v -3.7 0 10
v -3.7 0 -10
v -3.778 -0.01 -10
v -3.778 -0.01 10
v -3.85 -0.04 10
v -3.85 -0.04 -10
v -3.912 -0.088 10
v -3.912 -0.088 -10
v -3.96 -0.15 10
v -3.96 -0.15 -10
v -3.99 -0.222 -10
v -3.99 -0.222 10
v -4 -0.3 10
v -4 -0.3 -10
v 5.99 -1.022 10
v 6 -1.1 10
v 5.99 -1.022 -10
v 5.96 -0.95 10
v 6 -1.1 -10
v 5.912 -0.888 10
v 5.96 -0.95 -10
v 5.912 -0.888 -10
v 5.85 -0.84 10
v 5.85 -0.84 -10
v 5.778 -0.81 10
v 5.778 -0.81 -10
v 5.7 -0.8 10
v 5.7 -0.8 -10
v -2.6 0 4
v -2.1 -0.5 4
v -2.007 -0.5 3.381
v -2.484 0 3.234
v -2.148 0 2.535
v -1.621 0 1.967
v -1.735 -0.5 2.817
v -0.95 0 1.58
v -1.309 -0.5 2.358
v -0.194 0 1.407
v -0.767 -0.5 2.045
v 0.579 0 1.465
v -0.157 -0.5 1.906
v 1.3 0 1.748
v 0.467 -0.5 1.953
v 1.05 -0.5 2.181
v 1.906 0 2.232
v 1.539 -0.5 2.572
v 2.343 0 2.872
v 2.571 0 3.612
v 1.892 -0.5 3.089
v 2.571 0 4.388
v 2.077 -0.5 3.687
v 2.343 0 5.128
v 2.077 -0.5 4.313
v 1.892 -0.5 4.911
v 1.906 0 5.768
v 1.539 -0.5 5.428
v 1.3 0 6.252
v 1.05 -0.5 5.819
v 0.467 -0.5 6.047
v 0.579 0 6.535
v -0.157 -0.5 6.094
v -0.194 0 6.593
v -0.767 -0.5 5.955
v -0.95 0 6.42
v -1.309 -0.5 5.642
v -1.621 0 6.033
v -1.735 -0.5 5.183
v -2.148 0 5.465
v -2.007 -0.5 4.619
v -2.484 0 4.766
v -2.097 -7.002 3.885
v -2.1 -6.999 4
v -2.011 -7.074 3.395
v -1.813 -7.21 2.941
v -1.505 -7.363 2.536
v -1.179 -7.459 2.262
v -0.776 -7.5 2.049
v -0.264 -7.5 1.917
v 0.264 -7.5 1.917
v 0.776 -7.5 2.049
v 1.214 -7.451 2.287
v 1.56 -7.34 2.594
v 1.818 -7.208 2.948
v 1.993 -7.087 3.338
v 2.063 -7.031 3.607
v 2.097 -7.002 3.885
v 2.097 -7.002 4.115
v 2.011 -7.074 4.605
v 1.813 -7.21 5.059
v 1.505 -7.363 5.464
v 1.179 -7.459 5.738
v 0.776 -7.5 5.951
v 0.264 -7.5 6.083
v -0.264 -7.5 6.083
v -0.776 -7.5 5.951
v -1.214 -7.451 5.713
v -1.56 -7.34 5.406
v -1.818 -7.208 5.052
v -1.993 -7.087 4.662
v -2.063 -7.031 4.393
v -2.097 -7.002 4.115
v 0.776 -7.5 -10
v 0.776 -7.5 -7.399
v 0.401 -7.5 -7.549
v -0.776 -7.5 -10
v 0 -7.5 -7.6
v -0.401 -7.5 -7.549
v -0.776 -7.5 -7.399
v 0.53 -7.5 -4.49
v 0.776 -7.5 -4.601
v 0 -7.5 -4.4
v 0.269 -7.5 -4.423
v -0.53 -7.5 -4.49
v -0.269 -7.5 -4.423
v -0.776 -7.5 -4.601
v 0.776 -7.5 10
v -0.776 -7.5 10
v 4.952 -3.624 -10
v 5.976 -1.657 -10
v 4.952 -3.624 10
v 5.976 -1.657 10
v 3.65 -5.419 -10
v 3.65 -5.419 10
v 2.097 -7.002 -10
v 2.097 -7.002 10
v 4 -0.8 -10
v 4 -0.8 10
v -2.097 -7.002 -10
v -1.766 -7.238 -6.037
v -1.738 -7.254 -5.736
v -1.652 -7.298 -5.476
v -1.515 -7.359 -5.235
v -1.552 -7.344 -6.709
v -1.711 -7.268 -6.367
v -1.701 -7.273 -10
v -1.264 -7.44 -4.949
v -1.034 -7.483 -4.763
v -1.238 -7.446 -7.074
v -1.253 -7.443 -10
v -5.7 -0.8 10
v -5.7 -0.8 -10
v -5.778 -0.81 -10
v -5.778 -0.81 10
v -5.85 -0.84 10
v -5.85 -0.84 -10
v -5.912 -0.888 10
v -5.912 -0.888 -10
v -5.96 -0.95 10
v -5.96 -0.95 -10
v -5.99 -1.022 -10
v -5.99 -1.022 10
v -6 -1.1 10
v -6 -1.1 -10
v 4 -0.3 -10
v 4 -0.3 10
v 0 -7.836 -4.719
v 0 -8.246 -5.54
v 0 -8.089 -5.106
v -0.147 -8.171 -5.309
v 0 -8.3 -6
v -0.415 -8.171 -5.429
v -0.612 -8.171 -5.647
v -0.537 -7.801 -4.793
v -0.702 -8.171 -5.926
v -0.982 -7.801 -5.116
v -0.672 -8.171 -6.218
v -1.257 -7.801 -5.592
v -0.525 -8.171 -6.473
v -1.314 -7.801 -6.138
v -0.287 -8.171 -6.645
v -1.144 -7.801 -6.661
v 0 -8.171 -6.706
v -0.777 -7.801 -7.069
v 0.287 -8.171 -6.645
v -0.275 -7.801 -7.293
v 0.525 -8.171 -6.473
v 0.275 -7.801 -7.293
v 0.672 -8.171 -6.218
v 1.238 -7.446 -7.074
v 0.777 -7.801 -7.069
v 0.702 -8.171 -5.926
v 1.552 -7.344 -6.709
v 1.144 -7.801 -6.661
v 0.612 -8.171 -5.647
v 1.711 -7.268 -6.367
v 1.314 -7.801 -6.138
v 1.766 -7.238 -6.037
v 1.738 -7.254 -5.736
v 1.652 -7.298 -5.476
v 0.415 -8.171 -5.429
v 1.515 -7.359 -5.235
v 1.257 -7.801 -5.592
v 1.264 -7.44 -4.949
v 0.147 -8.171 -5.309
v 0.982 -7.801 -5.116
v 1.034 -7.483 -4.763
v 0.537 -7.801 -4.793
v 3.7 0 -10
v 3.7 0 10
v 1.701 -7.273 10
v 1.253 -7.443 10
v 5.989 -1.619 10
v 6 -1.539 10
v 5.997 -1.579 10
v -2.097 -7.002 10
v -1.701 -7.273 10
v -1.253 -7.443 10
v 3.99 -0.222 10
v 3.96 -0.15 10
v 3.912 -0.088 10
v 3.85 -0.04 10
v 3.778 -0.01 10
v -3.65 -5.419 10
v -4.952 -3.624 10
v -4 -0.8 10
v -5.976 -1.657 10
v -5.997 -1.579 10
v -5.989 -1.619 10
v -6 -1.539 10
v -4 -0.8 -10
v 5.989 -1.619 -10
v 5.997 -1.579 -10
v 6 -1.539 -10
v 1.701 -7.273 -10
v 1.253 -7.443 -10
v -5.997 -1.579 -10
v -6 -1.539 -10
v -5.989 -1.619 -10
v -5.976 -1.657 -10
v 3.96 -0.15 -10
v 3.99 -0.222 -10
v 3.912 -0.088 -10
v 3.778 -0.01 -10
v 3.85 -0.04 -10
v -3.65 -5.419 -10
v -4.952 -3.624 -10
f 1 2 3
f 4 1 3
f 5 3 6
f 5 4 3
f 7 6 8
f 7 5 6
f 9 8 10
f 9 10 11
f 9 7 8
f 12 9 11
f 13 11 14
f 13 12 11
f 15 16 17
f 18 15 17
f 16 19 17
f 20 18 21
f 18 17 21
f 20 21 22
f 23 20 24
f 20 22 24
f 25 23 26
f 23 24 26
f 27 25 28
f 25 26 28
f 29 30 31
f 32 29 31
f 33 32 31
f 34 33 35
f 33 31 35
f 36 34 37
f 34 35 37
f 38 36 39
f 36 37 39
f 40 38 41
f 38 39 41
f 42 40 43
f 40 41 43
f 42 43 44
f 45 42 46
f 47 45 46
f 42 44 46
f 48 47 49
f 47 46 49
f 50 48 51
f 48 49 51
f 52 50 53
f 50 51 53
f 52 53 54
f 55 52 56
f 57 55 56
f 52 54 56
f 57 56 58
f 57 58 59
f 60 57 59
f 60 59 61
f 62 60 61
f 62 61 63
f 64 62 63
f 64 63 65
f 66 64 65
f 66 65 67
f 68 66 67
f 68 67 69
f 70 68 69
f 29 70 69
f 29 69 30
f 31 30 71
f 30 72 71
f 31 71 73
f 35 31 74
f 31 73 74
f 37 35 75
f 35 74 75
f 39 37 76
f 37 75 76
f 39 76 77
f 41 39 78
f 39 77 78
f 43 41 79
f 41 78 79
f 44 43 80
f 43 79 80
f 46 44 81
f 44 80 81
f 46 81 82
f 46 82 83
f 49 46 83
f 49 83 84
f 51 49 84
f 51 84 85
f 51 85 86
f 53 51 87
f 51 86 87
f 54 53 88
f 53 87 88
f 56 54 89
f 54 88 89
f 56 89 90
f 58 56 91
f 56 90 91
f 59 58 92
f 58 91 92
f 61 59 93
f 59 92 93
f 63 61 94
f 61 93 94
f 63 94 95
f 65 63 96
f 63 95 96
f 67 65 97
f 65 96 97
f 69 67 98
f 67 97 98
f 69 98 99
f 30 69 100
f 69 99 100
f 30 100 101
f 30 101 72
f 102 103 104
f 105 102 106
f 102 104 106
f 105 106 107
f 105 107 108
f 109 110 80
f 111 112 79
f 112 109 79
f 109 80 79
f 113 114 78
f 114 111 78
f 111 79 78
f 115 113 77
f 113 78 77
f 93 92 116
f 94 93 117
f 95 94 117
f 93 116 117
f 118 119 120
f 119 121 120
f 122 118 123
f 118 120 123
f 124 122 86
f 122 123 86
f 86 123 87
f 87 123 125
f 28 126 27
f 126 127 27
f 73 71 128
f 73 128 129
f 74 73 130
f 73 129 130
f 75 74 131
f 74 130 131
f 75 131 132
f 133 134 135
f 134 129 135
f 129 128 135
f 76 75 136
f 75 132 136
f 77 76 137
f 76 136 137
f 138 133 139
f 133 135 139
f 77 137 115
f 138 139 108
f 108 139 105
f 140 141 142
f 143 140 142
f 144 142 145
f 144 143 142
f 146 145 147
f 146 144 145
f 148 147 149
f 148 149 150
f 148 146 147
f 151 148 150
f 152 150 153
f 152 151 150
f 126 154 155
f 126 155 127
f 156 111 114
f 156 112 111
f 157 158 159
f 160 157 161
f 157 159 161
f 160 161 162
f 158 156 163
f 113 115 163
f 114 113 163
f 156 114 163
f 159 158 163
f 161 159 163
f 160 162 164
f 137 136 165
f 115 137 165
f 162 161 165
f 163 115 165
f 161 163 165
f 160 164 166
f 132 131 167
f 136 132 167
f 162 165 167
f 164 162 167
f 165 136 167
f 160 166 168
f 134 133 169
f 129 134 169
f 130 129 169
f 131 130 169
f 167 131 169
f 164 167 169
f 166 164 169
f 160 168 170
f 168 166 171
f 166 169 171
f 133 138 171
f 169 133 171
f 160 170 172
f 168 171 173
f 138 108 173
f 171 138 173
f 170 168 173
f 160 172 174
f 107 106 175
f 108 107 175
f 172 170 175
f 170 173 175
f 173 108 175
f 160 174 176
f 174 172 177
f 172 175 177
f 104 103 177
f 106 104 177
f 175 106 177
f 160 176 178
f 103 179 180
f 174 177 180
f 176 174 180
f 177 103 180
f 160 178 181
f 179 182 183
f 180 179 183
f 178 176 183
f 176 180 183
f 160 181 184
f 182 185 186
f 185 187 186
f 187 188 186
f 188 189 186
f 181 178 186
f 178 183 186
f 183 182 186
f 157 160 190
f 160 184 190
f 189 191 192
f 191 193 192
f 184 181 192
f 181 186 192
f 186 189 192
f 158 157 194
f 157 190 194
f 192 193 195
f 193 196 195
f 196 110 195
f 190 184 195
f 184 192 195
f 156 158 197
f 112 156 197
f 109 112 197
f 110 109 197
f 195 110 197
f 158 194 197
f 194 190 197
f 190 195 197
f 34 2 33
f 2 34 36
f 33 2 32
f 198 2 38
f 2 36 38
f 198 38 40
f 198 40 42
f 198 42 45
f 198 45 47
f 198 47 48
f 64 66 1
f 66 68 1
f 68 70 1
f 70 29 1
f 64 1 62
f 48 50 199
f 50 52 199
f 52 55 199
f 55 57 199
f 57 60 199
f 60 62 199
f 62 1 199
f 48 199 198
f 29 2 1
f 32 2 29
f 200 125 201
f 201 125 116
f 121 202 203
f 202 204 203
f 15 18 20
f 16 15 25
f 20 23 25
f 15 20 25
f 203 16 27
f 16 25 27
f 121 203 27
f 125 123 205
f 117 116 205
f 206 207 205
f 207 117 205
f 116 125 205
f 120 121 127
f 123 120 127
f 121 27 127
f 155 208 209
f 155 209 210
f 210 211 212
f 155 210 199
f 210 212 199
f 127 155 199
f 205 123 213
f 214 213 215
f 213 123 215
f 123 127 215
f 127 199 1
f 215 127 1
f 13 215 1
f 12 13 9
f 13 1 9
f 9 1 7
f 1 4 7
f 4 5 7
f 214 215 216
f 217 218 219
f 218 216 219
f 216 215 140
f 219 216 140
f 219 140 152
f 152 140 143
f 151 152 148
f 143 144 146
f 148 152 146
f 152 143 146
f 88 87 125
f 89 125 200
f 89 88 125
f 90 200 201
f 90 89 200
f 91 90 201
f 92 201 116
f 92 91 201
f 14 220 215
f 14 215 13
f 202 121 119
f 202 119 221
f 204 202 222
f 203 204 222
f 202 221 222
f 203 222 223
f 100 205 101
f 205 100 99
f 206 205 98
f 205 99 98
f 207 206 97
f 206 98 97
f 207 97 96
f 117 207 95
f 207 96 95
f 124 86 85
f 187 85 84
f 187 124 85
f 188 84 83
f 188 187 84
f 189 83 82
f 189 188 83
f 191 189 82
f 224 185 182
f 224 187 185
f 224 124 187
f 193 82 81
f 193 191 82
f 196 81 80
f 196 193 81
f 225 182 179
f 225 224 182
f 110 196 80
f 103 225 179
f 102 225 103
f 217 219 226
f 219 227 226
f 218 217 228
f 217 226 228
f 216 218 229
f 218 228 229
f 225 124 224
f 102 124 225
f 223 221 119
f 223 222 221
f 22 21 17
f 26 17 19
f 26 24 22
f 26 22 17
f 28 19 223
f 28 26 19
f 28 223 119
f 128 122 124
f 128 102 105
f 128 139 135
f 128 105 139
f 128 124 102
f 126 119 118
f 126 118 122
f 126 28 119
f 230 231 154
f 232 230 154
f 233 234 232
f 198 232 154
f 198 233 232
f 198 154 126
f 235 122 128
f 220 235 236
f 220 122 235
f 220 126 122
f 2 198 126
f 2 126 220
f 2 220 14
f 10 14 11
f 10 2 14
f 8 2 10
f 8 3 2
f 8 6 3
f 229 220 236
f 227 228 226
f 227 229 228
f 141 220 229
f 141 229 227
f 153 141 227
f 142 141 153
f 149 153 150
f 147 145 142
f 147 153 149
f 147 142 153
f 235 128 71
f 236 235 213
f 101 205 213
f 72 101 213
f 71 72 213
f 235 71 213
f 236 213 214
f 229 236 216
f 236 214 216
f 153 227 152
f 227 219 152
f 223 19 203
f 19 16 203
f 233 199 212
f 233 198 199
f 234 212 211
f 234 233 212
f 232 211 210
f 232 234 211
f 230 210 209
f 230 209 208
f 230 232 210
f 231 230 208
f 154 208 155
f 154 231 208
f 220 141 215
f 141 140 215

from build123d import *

# Parameters (mm, degrees)
EXTRUDE_1_DEPTH             = 10
FILLET_1_R                  = 0.3
FILLET_2_R                  = 2
HOLE_WIZARD_M51_D           = 4.2
HOLE_WIZARD_M51_CSINK_D     = 5.2
HOLE_WIZARD_M51_CSINK_ANGLE = 90


with BuildPart() as part:
    # Эскиз1 → Бобышка-Вытянуть1 (new body, symmetric)
    with BuildSketch(Plane.XY):
        with BuildLine():
            Line((-4, 0), (4, 0))
            Line((4, 0), (4, -0.8))
            Line((4, -0.8), (6, -0.8))
            Line((6, -0.8), (6, -1.6))
            ThreePointArc((6, -1.6), (4.120585945, -4.832650297), (1.5, -7.5))
            Line((1.5, -7.5), (-1.5, -7.5))
            ThreePointArc((-1.5, -7.5), (-4.120585945, -4.832650297), (-6, -1.6))
            Line((-6, -1.6), (-6, -0.8))
            Line((-6, -0.8), (-4, -0.8))
            Line((-4, -0.8), (-4, 0))
        make_face()
    extrude(amount=EXTRUDE_1_DEPTH, both=True)

    # Скругление1
    fillet_1_edges = [part.edges().sort_by_distance(p)[0] for p in [
        (6, -0.8, 0),
        (6, -1.6, 0),
        (-6, -1.6, 0),
        (-6, -0.8, 0),
        (-4, 0, 0),
        (4, 0, 0),
    ]]
    fillet(fillet_1_edges, radius=FILLET_1_R)

    # Скругление2
    fillet_2_edges = [part.edges().sort_by_distance(p)[0] for p in [
        (1.5, -7.5, 0),
        (-1.5, -7.5, 0),
    ]]
    fillet(fillet_2_edges, radius=FILLET_2_R)

    # Отверстие обработанное метчиком M51 (through all)
    with Locations(Plane(origin=(0, 0, 0), x_dir=(1, 0, 0), z_dir=(0, 1, 0))):
        with Locations((0, -4)):
            CounterSinkHole(HOLE_WIZARD_M51_D / 2, HOLE_WIZARD_M51_CSINK_D / 2, counter_sink_angle=HOLE_WIZARD_M51_CSINK_ANGLE)

    # Эскиз5 → Повернуть1 (revolve)
    with BuildSketch(Plane(origin=(0, 0, 0), x_dir=(0, 0, -1), z_dir=(1, 0, 0))):
        with BuildLine():
            Line((6, -4.3), (6, -8.3))
            ThreePointArc((6, -8.3), (4, -6.3), (6, -4.3))
        make_face()
    revolve(axis=Axis((0, -4.3, -6), (0, -1, 0)))


solid = part.part
